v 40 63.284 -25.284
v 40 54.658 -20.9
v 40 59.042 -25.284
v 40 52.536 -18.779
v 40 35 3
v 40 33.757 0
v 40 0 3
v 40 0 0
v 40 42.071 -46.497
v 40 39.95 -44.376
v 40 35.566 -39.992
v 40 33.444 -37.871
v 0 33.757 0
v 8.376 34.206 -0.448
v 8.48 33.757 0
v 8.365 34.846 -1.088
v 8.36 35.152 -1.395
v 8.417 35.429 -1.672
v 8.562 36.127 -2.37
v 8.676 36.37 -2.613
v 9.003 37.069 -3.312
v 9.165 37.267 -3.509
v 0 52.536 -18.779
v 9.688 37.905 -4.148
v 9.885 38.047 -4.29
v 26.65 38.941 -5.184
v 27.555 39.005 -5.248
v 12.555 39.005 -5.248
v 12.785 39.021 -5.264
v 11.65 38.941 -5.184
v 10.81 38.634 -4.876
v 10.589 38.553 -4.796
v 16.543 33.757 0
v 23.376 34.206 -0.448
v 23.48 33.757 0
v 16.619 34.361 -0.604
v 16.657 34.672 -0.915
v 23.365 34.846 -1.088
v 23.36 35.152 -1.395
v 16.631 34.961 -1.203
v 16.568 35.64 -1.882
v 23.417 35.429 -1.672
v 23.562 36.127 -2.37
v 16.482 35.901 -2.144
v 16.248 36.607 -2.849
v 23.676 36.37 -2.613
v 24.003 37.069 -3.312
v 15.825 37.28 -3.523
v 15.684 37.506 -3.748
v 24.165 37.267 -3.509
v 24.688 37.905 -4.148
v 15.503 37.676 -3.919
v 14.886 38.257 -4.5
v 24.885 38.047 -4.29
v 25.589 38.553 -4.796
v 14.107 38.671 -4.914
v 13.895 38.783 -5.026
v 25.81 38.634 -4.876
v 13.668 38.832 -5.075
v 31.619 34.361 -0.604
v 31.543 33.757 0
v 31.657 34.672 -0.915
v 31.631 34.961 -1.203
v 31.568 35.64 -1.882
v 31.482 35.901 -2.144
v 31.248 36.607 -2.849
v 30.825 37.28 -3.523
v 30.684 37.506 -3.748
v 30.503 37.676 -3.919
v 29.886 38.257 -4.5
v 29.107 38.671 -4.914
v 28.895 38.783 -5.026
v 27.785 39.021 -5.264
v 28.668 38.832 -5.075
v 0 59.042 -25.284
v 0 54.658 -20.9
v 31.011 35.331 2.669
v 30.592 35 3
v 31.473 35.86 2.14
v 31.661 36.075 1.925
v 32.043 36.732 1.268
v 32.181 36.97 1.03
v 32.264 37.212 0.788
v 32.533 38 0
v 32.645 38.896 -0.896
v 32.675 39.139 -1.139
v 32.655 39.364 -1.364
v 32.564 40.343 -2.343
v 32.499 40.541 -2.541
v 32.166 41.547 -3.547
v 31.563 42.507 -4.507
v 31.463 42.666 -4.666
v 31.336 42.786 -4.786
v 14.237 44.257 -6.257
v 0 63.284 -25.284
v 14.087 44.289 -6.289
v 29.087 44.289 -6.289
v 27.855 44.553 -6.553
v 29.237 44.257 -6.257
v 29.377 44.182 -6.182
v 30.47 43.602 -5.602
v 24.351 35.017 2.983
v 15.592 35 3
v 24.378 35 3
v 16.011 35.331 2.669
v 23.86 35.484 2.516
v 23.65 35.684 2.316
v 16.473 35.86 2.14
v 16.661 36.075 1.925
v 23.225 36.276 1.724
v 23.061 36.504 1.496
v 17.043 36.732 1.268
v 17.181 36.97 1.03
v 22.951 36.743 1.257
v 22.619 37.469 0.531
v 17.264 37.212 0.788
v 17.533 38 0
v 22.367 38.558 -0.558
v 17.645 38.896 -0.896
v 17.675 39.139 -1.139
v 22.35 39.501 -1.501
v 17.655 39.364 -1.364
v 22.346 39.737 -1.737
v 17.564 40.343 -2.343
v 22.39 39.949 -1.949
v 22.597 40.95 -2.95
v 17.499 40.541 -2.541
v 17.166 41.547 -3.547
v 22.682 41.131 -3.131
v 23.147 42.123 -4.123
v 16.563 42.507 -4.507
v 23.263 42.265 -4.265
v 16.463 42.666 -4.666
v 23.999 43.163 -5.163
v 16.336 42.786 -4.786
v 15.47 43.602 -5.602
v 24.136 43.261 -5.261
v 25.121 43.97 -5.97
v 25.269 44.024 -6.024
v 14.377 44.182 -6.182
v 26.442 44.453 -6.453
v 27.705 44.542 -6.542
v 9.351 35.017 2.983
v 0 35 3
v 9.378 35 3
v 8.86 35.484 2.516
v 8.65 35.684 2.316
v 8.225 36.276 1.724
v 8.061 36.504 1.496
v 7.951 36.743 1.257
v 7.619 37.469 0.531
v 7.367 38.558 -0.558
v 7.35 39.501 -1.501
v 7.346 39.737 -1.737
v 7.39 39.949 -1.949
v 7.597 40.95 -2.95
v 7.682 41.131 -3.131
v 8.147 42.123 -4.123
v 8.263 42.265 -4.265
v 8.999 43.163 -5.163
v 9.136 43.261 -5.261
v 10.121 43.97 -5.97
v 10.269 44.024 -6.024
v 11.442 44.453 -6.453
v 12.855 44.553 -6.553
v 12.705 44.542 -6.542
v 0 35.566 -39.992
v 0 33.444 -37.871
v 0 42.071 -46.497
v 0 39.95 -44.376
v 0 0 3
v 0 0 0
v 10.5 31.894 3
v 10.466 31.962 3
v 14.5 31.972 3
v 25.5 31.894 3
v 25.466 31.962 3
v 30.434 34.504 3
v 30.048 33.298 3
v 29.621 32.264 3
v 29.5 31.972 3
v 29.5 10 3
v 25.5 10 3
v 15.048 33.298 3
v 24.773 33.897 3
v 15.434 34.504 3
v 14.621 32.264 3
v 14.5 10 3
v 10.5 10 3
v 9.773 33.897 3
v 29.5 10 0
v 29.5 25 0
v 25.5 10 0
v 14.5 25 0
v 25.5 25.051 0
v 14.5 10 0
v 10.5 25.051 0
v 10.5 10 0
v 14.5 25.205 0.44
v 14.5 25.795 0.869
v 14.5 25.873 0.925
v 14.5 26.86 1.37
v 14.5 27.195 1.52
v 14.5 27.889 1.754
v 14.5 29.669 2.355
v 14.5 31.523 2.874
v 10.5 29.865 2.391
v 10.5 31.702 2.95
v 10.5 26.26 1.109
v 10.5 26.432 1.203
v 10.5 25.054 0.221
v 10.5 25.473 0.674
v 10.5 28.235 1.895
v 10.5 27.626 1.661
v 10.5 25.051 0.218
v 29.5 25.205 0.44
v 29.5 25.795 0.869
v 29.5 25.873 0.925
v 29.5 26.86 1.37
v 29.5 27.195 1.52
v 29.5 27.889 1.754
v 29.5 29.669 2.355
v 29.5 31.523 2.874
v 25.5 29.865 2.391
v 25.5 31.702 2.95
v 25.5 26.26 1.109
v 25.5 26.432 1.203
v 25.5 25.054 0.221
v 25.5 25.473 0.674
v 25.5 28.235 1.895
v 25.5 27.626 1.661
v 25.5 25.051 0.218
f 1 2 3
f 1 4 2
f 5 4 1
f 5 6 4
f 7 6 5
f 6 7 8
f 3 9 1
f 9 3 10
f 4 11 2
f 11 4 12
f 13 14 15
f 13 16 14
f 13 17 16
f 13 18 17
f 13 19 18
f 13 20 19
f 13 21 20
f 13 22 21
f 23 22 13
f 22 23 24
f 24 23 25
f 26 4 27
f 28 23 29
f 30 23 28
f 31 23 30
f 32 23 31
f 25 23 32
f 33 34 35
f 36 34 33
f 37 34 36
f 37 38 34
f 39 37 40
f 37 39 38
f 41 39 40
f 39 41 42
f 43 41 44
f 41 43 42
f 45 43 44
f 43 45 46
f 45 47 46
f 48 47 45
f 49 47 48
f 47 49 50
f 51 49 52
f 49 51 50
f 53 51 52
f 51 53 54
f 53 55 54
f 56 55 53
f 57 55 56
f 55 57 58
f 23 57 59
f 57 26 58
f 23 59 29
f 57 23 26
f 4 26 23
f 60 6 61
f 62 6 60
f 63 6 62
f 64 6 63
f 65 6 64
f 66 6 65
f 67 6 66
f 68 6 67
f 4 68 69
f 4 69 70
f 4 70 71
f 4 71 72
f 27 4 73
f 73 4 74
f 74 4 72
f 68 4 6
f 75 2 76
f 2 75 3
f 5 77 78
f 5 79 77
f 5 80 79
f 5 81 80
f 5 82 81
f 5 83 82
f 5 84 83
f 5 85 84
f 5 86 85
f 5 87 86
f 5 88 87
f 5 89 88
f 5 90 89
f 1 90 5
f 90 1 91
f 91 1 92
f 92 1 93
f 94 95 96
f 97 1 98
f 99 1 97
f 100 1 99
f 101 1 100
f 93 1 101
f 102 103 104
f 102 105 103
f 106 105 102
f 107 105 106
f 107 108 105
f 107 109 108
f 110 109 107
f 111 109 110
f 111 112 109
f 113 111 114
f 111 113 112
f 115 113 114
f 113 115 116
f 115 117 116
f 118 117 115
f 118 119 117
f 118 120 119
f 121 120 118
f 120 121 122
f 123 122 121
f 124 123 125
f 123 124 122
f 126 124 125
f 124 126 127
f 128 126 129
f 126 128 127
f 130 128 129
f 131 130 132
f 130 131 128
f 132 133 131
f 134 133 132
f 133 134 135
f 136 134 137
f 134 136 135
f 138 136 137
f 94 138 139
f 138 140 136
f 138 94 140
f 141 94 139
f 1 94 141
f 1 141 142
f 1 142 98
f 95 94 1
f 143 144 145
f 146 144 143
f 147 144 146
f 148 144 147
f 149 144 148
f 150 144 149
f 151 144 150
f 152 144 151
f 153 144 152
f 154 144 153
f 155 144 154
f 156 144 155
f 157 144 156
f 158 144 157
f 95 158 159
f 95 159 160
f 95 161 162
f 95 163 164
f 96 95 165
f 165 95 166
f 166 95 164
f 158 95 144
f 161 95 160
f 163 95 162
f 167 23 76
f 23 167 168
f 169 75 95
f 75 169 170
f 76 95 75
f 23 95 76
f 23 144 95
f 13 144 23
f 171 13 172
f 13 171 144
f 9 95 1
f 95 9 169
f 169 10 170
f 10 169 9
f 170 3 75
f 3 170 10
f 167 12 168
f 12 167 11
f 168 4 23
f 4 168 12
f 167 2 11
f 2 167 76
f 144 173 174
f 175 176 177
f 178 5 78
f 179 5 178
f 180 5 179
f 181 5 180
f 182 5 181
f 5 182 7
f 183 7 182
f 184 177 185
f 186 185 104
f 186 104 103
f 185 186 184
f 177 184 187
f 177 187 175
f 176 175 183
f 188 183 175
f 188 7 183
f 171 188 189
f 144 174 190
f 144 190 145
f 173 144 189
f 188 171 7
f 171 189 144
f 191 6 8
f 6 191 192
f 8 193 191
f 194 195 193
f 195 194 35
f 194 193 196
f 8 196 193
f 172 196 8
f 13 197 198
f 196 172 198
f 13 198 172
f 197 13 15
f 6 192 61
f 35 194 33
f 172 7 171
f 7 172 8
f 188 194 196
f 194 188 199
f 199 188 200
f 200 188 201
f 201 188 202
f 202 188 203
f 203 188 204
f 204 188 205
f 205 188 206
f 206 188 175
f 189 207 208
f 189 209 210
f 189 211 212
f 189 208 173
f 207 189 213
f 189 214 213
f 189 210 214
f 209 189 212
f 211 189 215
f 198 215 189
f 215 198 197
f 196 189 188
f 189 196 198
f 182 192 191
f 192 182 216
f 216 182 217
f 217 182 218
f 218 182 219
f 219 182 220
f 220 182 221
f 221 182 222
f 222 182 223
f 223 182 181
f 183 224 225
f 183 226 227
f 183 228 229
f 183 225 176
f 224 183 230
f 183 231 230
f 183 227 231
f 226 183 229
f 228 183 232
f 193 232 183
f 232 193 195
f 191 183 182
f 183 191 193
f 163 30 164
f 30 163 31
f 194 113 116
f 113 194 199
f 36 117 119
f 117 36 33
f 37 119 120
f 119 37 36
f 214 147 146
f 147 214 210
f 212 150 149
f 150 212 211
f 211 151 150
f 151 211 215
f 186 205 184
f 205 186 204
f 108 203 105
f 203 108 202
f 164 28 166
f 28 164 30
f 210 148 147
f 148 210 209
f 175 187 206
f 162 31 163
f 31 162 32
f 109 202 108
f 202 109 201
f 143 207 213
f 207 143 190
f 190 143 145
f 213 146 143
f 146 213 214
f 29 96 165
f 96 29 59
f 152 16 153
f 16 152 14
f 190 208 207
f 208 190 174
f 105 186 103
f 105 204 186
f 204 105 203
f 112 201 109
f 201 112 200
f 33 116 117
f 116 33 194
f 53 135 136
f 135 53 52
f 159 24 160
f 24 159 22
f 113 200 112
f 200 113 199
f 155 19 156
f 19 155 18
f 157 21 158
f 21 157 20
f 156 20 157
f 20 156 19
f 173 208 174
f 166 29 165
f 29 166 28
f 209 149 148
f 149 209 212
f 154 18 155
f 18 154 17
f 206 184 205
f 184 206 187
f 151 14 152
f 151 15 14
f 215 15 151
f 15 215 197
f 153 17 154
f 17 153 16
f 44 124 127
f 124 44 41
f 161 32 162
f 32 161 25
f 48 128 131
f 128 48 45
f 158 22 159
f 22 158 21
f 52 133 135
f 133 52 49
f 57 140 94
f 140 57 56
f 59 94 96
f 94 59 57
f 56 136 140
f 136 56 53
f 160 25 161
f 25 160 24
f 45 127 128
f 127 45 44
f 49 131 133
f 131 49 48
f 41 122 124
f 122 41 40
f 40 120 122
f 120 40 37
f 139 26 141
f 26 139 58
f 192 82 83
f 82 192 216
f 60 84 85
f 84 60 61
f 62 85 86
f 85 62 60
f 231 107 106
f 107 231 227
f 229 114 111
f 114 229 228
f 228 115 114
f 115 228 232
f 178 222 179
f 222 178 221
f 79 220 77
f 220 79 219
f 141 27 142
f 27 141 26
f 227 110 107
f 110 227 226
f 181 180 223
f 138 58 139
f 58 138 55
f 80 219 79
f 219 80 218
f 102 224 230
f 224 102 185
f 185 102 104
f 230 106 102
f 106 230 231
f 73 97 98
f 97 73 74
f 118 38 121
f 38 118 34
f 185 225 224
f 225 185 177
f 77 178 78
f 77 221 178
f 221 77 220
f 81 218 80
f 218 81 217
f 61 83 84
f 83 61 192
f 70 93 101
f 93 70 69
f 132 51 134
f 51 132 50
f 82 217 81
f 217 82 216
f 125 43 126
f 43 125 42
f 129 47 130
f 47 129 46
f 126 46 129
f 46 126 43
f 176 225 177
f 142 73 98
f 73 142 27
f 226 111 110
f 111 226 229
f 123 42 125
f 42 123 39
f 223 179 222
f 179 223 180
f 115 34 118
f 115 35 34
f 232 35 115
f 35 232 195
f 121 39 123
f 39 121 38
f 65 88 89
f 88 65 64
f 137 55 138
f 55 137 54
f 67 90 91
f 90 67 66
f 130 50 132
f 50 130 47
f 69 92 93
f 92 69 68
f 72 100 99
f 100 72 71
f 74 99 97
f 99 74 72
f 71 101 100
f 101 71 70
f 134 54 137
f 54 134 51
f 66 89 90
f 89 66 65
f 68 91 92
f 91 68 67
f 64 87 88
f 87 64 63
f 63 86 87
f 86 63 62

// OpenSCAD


w = 3;
d = 4;

dw = 40;

hh = 30;

difference(){
union(){    
cube([dw,35,w]);//Front panel

translate([0,35,3])
rotate([135,0,0])
translate([0,-40,0])
{
cube([dw,40,w]);//top
    
cube([dw,w,hh]);
translate([0,w+6.2,0])
cube([dw,w,hh]);
}    
}

translate([dw/2-7.5-d/2,10,-.1])
cube([d,40,w+1]);
    
translate([dw/2+7.5-d/2,10,-.1])
cube([d,40,w+1]);    

translate([dw/2-7.5,25,0])
rotate([-90,0,0])
cylinder(30,2,9);

translate([dw/2+7.5,25,0])
rotate([-90,0,0])
cylinder(30,2,9);
}



